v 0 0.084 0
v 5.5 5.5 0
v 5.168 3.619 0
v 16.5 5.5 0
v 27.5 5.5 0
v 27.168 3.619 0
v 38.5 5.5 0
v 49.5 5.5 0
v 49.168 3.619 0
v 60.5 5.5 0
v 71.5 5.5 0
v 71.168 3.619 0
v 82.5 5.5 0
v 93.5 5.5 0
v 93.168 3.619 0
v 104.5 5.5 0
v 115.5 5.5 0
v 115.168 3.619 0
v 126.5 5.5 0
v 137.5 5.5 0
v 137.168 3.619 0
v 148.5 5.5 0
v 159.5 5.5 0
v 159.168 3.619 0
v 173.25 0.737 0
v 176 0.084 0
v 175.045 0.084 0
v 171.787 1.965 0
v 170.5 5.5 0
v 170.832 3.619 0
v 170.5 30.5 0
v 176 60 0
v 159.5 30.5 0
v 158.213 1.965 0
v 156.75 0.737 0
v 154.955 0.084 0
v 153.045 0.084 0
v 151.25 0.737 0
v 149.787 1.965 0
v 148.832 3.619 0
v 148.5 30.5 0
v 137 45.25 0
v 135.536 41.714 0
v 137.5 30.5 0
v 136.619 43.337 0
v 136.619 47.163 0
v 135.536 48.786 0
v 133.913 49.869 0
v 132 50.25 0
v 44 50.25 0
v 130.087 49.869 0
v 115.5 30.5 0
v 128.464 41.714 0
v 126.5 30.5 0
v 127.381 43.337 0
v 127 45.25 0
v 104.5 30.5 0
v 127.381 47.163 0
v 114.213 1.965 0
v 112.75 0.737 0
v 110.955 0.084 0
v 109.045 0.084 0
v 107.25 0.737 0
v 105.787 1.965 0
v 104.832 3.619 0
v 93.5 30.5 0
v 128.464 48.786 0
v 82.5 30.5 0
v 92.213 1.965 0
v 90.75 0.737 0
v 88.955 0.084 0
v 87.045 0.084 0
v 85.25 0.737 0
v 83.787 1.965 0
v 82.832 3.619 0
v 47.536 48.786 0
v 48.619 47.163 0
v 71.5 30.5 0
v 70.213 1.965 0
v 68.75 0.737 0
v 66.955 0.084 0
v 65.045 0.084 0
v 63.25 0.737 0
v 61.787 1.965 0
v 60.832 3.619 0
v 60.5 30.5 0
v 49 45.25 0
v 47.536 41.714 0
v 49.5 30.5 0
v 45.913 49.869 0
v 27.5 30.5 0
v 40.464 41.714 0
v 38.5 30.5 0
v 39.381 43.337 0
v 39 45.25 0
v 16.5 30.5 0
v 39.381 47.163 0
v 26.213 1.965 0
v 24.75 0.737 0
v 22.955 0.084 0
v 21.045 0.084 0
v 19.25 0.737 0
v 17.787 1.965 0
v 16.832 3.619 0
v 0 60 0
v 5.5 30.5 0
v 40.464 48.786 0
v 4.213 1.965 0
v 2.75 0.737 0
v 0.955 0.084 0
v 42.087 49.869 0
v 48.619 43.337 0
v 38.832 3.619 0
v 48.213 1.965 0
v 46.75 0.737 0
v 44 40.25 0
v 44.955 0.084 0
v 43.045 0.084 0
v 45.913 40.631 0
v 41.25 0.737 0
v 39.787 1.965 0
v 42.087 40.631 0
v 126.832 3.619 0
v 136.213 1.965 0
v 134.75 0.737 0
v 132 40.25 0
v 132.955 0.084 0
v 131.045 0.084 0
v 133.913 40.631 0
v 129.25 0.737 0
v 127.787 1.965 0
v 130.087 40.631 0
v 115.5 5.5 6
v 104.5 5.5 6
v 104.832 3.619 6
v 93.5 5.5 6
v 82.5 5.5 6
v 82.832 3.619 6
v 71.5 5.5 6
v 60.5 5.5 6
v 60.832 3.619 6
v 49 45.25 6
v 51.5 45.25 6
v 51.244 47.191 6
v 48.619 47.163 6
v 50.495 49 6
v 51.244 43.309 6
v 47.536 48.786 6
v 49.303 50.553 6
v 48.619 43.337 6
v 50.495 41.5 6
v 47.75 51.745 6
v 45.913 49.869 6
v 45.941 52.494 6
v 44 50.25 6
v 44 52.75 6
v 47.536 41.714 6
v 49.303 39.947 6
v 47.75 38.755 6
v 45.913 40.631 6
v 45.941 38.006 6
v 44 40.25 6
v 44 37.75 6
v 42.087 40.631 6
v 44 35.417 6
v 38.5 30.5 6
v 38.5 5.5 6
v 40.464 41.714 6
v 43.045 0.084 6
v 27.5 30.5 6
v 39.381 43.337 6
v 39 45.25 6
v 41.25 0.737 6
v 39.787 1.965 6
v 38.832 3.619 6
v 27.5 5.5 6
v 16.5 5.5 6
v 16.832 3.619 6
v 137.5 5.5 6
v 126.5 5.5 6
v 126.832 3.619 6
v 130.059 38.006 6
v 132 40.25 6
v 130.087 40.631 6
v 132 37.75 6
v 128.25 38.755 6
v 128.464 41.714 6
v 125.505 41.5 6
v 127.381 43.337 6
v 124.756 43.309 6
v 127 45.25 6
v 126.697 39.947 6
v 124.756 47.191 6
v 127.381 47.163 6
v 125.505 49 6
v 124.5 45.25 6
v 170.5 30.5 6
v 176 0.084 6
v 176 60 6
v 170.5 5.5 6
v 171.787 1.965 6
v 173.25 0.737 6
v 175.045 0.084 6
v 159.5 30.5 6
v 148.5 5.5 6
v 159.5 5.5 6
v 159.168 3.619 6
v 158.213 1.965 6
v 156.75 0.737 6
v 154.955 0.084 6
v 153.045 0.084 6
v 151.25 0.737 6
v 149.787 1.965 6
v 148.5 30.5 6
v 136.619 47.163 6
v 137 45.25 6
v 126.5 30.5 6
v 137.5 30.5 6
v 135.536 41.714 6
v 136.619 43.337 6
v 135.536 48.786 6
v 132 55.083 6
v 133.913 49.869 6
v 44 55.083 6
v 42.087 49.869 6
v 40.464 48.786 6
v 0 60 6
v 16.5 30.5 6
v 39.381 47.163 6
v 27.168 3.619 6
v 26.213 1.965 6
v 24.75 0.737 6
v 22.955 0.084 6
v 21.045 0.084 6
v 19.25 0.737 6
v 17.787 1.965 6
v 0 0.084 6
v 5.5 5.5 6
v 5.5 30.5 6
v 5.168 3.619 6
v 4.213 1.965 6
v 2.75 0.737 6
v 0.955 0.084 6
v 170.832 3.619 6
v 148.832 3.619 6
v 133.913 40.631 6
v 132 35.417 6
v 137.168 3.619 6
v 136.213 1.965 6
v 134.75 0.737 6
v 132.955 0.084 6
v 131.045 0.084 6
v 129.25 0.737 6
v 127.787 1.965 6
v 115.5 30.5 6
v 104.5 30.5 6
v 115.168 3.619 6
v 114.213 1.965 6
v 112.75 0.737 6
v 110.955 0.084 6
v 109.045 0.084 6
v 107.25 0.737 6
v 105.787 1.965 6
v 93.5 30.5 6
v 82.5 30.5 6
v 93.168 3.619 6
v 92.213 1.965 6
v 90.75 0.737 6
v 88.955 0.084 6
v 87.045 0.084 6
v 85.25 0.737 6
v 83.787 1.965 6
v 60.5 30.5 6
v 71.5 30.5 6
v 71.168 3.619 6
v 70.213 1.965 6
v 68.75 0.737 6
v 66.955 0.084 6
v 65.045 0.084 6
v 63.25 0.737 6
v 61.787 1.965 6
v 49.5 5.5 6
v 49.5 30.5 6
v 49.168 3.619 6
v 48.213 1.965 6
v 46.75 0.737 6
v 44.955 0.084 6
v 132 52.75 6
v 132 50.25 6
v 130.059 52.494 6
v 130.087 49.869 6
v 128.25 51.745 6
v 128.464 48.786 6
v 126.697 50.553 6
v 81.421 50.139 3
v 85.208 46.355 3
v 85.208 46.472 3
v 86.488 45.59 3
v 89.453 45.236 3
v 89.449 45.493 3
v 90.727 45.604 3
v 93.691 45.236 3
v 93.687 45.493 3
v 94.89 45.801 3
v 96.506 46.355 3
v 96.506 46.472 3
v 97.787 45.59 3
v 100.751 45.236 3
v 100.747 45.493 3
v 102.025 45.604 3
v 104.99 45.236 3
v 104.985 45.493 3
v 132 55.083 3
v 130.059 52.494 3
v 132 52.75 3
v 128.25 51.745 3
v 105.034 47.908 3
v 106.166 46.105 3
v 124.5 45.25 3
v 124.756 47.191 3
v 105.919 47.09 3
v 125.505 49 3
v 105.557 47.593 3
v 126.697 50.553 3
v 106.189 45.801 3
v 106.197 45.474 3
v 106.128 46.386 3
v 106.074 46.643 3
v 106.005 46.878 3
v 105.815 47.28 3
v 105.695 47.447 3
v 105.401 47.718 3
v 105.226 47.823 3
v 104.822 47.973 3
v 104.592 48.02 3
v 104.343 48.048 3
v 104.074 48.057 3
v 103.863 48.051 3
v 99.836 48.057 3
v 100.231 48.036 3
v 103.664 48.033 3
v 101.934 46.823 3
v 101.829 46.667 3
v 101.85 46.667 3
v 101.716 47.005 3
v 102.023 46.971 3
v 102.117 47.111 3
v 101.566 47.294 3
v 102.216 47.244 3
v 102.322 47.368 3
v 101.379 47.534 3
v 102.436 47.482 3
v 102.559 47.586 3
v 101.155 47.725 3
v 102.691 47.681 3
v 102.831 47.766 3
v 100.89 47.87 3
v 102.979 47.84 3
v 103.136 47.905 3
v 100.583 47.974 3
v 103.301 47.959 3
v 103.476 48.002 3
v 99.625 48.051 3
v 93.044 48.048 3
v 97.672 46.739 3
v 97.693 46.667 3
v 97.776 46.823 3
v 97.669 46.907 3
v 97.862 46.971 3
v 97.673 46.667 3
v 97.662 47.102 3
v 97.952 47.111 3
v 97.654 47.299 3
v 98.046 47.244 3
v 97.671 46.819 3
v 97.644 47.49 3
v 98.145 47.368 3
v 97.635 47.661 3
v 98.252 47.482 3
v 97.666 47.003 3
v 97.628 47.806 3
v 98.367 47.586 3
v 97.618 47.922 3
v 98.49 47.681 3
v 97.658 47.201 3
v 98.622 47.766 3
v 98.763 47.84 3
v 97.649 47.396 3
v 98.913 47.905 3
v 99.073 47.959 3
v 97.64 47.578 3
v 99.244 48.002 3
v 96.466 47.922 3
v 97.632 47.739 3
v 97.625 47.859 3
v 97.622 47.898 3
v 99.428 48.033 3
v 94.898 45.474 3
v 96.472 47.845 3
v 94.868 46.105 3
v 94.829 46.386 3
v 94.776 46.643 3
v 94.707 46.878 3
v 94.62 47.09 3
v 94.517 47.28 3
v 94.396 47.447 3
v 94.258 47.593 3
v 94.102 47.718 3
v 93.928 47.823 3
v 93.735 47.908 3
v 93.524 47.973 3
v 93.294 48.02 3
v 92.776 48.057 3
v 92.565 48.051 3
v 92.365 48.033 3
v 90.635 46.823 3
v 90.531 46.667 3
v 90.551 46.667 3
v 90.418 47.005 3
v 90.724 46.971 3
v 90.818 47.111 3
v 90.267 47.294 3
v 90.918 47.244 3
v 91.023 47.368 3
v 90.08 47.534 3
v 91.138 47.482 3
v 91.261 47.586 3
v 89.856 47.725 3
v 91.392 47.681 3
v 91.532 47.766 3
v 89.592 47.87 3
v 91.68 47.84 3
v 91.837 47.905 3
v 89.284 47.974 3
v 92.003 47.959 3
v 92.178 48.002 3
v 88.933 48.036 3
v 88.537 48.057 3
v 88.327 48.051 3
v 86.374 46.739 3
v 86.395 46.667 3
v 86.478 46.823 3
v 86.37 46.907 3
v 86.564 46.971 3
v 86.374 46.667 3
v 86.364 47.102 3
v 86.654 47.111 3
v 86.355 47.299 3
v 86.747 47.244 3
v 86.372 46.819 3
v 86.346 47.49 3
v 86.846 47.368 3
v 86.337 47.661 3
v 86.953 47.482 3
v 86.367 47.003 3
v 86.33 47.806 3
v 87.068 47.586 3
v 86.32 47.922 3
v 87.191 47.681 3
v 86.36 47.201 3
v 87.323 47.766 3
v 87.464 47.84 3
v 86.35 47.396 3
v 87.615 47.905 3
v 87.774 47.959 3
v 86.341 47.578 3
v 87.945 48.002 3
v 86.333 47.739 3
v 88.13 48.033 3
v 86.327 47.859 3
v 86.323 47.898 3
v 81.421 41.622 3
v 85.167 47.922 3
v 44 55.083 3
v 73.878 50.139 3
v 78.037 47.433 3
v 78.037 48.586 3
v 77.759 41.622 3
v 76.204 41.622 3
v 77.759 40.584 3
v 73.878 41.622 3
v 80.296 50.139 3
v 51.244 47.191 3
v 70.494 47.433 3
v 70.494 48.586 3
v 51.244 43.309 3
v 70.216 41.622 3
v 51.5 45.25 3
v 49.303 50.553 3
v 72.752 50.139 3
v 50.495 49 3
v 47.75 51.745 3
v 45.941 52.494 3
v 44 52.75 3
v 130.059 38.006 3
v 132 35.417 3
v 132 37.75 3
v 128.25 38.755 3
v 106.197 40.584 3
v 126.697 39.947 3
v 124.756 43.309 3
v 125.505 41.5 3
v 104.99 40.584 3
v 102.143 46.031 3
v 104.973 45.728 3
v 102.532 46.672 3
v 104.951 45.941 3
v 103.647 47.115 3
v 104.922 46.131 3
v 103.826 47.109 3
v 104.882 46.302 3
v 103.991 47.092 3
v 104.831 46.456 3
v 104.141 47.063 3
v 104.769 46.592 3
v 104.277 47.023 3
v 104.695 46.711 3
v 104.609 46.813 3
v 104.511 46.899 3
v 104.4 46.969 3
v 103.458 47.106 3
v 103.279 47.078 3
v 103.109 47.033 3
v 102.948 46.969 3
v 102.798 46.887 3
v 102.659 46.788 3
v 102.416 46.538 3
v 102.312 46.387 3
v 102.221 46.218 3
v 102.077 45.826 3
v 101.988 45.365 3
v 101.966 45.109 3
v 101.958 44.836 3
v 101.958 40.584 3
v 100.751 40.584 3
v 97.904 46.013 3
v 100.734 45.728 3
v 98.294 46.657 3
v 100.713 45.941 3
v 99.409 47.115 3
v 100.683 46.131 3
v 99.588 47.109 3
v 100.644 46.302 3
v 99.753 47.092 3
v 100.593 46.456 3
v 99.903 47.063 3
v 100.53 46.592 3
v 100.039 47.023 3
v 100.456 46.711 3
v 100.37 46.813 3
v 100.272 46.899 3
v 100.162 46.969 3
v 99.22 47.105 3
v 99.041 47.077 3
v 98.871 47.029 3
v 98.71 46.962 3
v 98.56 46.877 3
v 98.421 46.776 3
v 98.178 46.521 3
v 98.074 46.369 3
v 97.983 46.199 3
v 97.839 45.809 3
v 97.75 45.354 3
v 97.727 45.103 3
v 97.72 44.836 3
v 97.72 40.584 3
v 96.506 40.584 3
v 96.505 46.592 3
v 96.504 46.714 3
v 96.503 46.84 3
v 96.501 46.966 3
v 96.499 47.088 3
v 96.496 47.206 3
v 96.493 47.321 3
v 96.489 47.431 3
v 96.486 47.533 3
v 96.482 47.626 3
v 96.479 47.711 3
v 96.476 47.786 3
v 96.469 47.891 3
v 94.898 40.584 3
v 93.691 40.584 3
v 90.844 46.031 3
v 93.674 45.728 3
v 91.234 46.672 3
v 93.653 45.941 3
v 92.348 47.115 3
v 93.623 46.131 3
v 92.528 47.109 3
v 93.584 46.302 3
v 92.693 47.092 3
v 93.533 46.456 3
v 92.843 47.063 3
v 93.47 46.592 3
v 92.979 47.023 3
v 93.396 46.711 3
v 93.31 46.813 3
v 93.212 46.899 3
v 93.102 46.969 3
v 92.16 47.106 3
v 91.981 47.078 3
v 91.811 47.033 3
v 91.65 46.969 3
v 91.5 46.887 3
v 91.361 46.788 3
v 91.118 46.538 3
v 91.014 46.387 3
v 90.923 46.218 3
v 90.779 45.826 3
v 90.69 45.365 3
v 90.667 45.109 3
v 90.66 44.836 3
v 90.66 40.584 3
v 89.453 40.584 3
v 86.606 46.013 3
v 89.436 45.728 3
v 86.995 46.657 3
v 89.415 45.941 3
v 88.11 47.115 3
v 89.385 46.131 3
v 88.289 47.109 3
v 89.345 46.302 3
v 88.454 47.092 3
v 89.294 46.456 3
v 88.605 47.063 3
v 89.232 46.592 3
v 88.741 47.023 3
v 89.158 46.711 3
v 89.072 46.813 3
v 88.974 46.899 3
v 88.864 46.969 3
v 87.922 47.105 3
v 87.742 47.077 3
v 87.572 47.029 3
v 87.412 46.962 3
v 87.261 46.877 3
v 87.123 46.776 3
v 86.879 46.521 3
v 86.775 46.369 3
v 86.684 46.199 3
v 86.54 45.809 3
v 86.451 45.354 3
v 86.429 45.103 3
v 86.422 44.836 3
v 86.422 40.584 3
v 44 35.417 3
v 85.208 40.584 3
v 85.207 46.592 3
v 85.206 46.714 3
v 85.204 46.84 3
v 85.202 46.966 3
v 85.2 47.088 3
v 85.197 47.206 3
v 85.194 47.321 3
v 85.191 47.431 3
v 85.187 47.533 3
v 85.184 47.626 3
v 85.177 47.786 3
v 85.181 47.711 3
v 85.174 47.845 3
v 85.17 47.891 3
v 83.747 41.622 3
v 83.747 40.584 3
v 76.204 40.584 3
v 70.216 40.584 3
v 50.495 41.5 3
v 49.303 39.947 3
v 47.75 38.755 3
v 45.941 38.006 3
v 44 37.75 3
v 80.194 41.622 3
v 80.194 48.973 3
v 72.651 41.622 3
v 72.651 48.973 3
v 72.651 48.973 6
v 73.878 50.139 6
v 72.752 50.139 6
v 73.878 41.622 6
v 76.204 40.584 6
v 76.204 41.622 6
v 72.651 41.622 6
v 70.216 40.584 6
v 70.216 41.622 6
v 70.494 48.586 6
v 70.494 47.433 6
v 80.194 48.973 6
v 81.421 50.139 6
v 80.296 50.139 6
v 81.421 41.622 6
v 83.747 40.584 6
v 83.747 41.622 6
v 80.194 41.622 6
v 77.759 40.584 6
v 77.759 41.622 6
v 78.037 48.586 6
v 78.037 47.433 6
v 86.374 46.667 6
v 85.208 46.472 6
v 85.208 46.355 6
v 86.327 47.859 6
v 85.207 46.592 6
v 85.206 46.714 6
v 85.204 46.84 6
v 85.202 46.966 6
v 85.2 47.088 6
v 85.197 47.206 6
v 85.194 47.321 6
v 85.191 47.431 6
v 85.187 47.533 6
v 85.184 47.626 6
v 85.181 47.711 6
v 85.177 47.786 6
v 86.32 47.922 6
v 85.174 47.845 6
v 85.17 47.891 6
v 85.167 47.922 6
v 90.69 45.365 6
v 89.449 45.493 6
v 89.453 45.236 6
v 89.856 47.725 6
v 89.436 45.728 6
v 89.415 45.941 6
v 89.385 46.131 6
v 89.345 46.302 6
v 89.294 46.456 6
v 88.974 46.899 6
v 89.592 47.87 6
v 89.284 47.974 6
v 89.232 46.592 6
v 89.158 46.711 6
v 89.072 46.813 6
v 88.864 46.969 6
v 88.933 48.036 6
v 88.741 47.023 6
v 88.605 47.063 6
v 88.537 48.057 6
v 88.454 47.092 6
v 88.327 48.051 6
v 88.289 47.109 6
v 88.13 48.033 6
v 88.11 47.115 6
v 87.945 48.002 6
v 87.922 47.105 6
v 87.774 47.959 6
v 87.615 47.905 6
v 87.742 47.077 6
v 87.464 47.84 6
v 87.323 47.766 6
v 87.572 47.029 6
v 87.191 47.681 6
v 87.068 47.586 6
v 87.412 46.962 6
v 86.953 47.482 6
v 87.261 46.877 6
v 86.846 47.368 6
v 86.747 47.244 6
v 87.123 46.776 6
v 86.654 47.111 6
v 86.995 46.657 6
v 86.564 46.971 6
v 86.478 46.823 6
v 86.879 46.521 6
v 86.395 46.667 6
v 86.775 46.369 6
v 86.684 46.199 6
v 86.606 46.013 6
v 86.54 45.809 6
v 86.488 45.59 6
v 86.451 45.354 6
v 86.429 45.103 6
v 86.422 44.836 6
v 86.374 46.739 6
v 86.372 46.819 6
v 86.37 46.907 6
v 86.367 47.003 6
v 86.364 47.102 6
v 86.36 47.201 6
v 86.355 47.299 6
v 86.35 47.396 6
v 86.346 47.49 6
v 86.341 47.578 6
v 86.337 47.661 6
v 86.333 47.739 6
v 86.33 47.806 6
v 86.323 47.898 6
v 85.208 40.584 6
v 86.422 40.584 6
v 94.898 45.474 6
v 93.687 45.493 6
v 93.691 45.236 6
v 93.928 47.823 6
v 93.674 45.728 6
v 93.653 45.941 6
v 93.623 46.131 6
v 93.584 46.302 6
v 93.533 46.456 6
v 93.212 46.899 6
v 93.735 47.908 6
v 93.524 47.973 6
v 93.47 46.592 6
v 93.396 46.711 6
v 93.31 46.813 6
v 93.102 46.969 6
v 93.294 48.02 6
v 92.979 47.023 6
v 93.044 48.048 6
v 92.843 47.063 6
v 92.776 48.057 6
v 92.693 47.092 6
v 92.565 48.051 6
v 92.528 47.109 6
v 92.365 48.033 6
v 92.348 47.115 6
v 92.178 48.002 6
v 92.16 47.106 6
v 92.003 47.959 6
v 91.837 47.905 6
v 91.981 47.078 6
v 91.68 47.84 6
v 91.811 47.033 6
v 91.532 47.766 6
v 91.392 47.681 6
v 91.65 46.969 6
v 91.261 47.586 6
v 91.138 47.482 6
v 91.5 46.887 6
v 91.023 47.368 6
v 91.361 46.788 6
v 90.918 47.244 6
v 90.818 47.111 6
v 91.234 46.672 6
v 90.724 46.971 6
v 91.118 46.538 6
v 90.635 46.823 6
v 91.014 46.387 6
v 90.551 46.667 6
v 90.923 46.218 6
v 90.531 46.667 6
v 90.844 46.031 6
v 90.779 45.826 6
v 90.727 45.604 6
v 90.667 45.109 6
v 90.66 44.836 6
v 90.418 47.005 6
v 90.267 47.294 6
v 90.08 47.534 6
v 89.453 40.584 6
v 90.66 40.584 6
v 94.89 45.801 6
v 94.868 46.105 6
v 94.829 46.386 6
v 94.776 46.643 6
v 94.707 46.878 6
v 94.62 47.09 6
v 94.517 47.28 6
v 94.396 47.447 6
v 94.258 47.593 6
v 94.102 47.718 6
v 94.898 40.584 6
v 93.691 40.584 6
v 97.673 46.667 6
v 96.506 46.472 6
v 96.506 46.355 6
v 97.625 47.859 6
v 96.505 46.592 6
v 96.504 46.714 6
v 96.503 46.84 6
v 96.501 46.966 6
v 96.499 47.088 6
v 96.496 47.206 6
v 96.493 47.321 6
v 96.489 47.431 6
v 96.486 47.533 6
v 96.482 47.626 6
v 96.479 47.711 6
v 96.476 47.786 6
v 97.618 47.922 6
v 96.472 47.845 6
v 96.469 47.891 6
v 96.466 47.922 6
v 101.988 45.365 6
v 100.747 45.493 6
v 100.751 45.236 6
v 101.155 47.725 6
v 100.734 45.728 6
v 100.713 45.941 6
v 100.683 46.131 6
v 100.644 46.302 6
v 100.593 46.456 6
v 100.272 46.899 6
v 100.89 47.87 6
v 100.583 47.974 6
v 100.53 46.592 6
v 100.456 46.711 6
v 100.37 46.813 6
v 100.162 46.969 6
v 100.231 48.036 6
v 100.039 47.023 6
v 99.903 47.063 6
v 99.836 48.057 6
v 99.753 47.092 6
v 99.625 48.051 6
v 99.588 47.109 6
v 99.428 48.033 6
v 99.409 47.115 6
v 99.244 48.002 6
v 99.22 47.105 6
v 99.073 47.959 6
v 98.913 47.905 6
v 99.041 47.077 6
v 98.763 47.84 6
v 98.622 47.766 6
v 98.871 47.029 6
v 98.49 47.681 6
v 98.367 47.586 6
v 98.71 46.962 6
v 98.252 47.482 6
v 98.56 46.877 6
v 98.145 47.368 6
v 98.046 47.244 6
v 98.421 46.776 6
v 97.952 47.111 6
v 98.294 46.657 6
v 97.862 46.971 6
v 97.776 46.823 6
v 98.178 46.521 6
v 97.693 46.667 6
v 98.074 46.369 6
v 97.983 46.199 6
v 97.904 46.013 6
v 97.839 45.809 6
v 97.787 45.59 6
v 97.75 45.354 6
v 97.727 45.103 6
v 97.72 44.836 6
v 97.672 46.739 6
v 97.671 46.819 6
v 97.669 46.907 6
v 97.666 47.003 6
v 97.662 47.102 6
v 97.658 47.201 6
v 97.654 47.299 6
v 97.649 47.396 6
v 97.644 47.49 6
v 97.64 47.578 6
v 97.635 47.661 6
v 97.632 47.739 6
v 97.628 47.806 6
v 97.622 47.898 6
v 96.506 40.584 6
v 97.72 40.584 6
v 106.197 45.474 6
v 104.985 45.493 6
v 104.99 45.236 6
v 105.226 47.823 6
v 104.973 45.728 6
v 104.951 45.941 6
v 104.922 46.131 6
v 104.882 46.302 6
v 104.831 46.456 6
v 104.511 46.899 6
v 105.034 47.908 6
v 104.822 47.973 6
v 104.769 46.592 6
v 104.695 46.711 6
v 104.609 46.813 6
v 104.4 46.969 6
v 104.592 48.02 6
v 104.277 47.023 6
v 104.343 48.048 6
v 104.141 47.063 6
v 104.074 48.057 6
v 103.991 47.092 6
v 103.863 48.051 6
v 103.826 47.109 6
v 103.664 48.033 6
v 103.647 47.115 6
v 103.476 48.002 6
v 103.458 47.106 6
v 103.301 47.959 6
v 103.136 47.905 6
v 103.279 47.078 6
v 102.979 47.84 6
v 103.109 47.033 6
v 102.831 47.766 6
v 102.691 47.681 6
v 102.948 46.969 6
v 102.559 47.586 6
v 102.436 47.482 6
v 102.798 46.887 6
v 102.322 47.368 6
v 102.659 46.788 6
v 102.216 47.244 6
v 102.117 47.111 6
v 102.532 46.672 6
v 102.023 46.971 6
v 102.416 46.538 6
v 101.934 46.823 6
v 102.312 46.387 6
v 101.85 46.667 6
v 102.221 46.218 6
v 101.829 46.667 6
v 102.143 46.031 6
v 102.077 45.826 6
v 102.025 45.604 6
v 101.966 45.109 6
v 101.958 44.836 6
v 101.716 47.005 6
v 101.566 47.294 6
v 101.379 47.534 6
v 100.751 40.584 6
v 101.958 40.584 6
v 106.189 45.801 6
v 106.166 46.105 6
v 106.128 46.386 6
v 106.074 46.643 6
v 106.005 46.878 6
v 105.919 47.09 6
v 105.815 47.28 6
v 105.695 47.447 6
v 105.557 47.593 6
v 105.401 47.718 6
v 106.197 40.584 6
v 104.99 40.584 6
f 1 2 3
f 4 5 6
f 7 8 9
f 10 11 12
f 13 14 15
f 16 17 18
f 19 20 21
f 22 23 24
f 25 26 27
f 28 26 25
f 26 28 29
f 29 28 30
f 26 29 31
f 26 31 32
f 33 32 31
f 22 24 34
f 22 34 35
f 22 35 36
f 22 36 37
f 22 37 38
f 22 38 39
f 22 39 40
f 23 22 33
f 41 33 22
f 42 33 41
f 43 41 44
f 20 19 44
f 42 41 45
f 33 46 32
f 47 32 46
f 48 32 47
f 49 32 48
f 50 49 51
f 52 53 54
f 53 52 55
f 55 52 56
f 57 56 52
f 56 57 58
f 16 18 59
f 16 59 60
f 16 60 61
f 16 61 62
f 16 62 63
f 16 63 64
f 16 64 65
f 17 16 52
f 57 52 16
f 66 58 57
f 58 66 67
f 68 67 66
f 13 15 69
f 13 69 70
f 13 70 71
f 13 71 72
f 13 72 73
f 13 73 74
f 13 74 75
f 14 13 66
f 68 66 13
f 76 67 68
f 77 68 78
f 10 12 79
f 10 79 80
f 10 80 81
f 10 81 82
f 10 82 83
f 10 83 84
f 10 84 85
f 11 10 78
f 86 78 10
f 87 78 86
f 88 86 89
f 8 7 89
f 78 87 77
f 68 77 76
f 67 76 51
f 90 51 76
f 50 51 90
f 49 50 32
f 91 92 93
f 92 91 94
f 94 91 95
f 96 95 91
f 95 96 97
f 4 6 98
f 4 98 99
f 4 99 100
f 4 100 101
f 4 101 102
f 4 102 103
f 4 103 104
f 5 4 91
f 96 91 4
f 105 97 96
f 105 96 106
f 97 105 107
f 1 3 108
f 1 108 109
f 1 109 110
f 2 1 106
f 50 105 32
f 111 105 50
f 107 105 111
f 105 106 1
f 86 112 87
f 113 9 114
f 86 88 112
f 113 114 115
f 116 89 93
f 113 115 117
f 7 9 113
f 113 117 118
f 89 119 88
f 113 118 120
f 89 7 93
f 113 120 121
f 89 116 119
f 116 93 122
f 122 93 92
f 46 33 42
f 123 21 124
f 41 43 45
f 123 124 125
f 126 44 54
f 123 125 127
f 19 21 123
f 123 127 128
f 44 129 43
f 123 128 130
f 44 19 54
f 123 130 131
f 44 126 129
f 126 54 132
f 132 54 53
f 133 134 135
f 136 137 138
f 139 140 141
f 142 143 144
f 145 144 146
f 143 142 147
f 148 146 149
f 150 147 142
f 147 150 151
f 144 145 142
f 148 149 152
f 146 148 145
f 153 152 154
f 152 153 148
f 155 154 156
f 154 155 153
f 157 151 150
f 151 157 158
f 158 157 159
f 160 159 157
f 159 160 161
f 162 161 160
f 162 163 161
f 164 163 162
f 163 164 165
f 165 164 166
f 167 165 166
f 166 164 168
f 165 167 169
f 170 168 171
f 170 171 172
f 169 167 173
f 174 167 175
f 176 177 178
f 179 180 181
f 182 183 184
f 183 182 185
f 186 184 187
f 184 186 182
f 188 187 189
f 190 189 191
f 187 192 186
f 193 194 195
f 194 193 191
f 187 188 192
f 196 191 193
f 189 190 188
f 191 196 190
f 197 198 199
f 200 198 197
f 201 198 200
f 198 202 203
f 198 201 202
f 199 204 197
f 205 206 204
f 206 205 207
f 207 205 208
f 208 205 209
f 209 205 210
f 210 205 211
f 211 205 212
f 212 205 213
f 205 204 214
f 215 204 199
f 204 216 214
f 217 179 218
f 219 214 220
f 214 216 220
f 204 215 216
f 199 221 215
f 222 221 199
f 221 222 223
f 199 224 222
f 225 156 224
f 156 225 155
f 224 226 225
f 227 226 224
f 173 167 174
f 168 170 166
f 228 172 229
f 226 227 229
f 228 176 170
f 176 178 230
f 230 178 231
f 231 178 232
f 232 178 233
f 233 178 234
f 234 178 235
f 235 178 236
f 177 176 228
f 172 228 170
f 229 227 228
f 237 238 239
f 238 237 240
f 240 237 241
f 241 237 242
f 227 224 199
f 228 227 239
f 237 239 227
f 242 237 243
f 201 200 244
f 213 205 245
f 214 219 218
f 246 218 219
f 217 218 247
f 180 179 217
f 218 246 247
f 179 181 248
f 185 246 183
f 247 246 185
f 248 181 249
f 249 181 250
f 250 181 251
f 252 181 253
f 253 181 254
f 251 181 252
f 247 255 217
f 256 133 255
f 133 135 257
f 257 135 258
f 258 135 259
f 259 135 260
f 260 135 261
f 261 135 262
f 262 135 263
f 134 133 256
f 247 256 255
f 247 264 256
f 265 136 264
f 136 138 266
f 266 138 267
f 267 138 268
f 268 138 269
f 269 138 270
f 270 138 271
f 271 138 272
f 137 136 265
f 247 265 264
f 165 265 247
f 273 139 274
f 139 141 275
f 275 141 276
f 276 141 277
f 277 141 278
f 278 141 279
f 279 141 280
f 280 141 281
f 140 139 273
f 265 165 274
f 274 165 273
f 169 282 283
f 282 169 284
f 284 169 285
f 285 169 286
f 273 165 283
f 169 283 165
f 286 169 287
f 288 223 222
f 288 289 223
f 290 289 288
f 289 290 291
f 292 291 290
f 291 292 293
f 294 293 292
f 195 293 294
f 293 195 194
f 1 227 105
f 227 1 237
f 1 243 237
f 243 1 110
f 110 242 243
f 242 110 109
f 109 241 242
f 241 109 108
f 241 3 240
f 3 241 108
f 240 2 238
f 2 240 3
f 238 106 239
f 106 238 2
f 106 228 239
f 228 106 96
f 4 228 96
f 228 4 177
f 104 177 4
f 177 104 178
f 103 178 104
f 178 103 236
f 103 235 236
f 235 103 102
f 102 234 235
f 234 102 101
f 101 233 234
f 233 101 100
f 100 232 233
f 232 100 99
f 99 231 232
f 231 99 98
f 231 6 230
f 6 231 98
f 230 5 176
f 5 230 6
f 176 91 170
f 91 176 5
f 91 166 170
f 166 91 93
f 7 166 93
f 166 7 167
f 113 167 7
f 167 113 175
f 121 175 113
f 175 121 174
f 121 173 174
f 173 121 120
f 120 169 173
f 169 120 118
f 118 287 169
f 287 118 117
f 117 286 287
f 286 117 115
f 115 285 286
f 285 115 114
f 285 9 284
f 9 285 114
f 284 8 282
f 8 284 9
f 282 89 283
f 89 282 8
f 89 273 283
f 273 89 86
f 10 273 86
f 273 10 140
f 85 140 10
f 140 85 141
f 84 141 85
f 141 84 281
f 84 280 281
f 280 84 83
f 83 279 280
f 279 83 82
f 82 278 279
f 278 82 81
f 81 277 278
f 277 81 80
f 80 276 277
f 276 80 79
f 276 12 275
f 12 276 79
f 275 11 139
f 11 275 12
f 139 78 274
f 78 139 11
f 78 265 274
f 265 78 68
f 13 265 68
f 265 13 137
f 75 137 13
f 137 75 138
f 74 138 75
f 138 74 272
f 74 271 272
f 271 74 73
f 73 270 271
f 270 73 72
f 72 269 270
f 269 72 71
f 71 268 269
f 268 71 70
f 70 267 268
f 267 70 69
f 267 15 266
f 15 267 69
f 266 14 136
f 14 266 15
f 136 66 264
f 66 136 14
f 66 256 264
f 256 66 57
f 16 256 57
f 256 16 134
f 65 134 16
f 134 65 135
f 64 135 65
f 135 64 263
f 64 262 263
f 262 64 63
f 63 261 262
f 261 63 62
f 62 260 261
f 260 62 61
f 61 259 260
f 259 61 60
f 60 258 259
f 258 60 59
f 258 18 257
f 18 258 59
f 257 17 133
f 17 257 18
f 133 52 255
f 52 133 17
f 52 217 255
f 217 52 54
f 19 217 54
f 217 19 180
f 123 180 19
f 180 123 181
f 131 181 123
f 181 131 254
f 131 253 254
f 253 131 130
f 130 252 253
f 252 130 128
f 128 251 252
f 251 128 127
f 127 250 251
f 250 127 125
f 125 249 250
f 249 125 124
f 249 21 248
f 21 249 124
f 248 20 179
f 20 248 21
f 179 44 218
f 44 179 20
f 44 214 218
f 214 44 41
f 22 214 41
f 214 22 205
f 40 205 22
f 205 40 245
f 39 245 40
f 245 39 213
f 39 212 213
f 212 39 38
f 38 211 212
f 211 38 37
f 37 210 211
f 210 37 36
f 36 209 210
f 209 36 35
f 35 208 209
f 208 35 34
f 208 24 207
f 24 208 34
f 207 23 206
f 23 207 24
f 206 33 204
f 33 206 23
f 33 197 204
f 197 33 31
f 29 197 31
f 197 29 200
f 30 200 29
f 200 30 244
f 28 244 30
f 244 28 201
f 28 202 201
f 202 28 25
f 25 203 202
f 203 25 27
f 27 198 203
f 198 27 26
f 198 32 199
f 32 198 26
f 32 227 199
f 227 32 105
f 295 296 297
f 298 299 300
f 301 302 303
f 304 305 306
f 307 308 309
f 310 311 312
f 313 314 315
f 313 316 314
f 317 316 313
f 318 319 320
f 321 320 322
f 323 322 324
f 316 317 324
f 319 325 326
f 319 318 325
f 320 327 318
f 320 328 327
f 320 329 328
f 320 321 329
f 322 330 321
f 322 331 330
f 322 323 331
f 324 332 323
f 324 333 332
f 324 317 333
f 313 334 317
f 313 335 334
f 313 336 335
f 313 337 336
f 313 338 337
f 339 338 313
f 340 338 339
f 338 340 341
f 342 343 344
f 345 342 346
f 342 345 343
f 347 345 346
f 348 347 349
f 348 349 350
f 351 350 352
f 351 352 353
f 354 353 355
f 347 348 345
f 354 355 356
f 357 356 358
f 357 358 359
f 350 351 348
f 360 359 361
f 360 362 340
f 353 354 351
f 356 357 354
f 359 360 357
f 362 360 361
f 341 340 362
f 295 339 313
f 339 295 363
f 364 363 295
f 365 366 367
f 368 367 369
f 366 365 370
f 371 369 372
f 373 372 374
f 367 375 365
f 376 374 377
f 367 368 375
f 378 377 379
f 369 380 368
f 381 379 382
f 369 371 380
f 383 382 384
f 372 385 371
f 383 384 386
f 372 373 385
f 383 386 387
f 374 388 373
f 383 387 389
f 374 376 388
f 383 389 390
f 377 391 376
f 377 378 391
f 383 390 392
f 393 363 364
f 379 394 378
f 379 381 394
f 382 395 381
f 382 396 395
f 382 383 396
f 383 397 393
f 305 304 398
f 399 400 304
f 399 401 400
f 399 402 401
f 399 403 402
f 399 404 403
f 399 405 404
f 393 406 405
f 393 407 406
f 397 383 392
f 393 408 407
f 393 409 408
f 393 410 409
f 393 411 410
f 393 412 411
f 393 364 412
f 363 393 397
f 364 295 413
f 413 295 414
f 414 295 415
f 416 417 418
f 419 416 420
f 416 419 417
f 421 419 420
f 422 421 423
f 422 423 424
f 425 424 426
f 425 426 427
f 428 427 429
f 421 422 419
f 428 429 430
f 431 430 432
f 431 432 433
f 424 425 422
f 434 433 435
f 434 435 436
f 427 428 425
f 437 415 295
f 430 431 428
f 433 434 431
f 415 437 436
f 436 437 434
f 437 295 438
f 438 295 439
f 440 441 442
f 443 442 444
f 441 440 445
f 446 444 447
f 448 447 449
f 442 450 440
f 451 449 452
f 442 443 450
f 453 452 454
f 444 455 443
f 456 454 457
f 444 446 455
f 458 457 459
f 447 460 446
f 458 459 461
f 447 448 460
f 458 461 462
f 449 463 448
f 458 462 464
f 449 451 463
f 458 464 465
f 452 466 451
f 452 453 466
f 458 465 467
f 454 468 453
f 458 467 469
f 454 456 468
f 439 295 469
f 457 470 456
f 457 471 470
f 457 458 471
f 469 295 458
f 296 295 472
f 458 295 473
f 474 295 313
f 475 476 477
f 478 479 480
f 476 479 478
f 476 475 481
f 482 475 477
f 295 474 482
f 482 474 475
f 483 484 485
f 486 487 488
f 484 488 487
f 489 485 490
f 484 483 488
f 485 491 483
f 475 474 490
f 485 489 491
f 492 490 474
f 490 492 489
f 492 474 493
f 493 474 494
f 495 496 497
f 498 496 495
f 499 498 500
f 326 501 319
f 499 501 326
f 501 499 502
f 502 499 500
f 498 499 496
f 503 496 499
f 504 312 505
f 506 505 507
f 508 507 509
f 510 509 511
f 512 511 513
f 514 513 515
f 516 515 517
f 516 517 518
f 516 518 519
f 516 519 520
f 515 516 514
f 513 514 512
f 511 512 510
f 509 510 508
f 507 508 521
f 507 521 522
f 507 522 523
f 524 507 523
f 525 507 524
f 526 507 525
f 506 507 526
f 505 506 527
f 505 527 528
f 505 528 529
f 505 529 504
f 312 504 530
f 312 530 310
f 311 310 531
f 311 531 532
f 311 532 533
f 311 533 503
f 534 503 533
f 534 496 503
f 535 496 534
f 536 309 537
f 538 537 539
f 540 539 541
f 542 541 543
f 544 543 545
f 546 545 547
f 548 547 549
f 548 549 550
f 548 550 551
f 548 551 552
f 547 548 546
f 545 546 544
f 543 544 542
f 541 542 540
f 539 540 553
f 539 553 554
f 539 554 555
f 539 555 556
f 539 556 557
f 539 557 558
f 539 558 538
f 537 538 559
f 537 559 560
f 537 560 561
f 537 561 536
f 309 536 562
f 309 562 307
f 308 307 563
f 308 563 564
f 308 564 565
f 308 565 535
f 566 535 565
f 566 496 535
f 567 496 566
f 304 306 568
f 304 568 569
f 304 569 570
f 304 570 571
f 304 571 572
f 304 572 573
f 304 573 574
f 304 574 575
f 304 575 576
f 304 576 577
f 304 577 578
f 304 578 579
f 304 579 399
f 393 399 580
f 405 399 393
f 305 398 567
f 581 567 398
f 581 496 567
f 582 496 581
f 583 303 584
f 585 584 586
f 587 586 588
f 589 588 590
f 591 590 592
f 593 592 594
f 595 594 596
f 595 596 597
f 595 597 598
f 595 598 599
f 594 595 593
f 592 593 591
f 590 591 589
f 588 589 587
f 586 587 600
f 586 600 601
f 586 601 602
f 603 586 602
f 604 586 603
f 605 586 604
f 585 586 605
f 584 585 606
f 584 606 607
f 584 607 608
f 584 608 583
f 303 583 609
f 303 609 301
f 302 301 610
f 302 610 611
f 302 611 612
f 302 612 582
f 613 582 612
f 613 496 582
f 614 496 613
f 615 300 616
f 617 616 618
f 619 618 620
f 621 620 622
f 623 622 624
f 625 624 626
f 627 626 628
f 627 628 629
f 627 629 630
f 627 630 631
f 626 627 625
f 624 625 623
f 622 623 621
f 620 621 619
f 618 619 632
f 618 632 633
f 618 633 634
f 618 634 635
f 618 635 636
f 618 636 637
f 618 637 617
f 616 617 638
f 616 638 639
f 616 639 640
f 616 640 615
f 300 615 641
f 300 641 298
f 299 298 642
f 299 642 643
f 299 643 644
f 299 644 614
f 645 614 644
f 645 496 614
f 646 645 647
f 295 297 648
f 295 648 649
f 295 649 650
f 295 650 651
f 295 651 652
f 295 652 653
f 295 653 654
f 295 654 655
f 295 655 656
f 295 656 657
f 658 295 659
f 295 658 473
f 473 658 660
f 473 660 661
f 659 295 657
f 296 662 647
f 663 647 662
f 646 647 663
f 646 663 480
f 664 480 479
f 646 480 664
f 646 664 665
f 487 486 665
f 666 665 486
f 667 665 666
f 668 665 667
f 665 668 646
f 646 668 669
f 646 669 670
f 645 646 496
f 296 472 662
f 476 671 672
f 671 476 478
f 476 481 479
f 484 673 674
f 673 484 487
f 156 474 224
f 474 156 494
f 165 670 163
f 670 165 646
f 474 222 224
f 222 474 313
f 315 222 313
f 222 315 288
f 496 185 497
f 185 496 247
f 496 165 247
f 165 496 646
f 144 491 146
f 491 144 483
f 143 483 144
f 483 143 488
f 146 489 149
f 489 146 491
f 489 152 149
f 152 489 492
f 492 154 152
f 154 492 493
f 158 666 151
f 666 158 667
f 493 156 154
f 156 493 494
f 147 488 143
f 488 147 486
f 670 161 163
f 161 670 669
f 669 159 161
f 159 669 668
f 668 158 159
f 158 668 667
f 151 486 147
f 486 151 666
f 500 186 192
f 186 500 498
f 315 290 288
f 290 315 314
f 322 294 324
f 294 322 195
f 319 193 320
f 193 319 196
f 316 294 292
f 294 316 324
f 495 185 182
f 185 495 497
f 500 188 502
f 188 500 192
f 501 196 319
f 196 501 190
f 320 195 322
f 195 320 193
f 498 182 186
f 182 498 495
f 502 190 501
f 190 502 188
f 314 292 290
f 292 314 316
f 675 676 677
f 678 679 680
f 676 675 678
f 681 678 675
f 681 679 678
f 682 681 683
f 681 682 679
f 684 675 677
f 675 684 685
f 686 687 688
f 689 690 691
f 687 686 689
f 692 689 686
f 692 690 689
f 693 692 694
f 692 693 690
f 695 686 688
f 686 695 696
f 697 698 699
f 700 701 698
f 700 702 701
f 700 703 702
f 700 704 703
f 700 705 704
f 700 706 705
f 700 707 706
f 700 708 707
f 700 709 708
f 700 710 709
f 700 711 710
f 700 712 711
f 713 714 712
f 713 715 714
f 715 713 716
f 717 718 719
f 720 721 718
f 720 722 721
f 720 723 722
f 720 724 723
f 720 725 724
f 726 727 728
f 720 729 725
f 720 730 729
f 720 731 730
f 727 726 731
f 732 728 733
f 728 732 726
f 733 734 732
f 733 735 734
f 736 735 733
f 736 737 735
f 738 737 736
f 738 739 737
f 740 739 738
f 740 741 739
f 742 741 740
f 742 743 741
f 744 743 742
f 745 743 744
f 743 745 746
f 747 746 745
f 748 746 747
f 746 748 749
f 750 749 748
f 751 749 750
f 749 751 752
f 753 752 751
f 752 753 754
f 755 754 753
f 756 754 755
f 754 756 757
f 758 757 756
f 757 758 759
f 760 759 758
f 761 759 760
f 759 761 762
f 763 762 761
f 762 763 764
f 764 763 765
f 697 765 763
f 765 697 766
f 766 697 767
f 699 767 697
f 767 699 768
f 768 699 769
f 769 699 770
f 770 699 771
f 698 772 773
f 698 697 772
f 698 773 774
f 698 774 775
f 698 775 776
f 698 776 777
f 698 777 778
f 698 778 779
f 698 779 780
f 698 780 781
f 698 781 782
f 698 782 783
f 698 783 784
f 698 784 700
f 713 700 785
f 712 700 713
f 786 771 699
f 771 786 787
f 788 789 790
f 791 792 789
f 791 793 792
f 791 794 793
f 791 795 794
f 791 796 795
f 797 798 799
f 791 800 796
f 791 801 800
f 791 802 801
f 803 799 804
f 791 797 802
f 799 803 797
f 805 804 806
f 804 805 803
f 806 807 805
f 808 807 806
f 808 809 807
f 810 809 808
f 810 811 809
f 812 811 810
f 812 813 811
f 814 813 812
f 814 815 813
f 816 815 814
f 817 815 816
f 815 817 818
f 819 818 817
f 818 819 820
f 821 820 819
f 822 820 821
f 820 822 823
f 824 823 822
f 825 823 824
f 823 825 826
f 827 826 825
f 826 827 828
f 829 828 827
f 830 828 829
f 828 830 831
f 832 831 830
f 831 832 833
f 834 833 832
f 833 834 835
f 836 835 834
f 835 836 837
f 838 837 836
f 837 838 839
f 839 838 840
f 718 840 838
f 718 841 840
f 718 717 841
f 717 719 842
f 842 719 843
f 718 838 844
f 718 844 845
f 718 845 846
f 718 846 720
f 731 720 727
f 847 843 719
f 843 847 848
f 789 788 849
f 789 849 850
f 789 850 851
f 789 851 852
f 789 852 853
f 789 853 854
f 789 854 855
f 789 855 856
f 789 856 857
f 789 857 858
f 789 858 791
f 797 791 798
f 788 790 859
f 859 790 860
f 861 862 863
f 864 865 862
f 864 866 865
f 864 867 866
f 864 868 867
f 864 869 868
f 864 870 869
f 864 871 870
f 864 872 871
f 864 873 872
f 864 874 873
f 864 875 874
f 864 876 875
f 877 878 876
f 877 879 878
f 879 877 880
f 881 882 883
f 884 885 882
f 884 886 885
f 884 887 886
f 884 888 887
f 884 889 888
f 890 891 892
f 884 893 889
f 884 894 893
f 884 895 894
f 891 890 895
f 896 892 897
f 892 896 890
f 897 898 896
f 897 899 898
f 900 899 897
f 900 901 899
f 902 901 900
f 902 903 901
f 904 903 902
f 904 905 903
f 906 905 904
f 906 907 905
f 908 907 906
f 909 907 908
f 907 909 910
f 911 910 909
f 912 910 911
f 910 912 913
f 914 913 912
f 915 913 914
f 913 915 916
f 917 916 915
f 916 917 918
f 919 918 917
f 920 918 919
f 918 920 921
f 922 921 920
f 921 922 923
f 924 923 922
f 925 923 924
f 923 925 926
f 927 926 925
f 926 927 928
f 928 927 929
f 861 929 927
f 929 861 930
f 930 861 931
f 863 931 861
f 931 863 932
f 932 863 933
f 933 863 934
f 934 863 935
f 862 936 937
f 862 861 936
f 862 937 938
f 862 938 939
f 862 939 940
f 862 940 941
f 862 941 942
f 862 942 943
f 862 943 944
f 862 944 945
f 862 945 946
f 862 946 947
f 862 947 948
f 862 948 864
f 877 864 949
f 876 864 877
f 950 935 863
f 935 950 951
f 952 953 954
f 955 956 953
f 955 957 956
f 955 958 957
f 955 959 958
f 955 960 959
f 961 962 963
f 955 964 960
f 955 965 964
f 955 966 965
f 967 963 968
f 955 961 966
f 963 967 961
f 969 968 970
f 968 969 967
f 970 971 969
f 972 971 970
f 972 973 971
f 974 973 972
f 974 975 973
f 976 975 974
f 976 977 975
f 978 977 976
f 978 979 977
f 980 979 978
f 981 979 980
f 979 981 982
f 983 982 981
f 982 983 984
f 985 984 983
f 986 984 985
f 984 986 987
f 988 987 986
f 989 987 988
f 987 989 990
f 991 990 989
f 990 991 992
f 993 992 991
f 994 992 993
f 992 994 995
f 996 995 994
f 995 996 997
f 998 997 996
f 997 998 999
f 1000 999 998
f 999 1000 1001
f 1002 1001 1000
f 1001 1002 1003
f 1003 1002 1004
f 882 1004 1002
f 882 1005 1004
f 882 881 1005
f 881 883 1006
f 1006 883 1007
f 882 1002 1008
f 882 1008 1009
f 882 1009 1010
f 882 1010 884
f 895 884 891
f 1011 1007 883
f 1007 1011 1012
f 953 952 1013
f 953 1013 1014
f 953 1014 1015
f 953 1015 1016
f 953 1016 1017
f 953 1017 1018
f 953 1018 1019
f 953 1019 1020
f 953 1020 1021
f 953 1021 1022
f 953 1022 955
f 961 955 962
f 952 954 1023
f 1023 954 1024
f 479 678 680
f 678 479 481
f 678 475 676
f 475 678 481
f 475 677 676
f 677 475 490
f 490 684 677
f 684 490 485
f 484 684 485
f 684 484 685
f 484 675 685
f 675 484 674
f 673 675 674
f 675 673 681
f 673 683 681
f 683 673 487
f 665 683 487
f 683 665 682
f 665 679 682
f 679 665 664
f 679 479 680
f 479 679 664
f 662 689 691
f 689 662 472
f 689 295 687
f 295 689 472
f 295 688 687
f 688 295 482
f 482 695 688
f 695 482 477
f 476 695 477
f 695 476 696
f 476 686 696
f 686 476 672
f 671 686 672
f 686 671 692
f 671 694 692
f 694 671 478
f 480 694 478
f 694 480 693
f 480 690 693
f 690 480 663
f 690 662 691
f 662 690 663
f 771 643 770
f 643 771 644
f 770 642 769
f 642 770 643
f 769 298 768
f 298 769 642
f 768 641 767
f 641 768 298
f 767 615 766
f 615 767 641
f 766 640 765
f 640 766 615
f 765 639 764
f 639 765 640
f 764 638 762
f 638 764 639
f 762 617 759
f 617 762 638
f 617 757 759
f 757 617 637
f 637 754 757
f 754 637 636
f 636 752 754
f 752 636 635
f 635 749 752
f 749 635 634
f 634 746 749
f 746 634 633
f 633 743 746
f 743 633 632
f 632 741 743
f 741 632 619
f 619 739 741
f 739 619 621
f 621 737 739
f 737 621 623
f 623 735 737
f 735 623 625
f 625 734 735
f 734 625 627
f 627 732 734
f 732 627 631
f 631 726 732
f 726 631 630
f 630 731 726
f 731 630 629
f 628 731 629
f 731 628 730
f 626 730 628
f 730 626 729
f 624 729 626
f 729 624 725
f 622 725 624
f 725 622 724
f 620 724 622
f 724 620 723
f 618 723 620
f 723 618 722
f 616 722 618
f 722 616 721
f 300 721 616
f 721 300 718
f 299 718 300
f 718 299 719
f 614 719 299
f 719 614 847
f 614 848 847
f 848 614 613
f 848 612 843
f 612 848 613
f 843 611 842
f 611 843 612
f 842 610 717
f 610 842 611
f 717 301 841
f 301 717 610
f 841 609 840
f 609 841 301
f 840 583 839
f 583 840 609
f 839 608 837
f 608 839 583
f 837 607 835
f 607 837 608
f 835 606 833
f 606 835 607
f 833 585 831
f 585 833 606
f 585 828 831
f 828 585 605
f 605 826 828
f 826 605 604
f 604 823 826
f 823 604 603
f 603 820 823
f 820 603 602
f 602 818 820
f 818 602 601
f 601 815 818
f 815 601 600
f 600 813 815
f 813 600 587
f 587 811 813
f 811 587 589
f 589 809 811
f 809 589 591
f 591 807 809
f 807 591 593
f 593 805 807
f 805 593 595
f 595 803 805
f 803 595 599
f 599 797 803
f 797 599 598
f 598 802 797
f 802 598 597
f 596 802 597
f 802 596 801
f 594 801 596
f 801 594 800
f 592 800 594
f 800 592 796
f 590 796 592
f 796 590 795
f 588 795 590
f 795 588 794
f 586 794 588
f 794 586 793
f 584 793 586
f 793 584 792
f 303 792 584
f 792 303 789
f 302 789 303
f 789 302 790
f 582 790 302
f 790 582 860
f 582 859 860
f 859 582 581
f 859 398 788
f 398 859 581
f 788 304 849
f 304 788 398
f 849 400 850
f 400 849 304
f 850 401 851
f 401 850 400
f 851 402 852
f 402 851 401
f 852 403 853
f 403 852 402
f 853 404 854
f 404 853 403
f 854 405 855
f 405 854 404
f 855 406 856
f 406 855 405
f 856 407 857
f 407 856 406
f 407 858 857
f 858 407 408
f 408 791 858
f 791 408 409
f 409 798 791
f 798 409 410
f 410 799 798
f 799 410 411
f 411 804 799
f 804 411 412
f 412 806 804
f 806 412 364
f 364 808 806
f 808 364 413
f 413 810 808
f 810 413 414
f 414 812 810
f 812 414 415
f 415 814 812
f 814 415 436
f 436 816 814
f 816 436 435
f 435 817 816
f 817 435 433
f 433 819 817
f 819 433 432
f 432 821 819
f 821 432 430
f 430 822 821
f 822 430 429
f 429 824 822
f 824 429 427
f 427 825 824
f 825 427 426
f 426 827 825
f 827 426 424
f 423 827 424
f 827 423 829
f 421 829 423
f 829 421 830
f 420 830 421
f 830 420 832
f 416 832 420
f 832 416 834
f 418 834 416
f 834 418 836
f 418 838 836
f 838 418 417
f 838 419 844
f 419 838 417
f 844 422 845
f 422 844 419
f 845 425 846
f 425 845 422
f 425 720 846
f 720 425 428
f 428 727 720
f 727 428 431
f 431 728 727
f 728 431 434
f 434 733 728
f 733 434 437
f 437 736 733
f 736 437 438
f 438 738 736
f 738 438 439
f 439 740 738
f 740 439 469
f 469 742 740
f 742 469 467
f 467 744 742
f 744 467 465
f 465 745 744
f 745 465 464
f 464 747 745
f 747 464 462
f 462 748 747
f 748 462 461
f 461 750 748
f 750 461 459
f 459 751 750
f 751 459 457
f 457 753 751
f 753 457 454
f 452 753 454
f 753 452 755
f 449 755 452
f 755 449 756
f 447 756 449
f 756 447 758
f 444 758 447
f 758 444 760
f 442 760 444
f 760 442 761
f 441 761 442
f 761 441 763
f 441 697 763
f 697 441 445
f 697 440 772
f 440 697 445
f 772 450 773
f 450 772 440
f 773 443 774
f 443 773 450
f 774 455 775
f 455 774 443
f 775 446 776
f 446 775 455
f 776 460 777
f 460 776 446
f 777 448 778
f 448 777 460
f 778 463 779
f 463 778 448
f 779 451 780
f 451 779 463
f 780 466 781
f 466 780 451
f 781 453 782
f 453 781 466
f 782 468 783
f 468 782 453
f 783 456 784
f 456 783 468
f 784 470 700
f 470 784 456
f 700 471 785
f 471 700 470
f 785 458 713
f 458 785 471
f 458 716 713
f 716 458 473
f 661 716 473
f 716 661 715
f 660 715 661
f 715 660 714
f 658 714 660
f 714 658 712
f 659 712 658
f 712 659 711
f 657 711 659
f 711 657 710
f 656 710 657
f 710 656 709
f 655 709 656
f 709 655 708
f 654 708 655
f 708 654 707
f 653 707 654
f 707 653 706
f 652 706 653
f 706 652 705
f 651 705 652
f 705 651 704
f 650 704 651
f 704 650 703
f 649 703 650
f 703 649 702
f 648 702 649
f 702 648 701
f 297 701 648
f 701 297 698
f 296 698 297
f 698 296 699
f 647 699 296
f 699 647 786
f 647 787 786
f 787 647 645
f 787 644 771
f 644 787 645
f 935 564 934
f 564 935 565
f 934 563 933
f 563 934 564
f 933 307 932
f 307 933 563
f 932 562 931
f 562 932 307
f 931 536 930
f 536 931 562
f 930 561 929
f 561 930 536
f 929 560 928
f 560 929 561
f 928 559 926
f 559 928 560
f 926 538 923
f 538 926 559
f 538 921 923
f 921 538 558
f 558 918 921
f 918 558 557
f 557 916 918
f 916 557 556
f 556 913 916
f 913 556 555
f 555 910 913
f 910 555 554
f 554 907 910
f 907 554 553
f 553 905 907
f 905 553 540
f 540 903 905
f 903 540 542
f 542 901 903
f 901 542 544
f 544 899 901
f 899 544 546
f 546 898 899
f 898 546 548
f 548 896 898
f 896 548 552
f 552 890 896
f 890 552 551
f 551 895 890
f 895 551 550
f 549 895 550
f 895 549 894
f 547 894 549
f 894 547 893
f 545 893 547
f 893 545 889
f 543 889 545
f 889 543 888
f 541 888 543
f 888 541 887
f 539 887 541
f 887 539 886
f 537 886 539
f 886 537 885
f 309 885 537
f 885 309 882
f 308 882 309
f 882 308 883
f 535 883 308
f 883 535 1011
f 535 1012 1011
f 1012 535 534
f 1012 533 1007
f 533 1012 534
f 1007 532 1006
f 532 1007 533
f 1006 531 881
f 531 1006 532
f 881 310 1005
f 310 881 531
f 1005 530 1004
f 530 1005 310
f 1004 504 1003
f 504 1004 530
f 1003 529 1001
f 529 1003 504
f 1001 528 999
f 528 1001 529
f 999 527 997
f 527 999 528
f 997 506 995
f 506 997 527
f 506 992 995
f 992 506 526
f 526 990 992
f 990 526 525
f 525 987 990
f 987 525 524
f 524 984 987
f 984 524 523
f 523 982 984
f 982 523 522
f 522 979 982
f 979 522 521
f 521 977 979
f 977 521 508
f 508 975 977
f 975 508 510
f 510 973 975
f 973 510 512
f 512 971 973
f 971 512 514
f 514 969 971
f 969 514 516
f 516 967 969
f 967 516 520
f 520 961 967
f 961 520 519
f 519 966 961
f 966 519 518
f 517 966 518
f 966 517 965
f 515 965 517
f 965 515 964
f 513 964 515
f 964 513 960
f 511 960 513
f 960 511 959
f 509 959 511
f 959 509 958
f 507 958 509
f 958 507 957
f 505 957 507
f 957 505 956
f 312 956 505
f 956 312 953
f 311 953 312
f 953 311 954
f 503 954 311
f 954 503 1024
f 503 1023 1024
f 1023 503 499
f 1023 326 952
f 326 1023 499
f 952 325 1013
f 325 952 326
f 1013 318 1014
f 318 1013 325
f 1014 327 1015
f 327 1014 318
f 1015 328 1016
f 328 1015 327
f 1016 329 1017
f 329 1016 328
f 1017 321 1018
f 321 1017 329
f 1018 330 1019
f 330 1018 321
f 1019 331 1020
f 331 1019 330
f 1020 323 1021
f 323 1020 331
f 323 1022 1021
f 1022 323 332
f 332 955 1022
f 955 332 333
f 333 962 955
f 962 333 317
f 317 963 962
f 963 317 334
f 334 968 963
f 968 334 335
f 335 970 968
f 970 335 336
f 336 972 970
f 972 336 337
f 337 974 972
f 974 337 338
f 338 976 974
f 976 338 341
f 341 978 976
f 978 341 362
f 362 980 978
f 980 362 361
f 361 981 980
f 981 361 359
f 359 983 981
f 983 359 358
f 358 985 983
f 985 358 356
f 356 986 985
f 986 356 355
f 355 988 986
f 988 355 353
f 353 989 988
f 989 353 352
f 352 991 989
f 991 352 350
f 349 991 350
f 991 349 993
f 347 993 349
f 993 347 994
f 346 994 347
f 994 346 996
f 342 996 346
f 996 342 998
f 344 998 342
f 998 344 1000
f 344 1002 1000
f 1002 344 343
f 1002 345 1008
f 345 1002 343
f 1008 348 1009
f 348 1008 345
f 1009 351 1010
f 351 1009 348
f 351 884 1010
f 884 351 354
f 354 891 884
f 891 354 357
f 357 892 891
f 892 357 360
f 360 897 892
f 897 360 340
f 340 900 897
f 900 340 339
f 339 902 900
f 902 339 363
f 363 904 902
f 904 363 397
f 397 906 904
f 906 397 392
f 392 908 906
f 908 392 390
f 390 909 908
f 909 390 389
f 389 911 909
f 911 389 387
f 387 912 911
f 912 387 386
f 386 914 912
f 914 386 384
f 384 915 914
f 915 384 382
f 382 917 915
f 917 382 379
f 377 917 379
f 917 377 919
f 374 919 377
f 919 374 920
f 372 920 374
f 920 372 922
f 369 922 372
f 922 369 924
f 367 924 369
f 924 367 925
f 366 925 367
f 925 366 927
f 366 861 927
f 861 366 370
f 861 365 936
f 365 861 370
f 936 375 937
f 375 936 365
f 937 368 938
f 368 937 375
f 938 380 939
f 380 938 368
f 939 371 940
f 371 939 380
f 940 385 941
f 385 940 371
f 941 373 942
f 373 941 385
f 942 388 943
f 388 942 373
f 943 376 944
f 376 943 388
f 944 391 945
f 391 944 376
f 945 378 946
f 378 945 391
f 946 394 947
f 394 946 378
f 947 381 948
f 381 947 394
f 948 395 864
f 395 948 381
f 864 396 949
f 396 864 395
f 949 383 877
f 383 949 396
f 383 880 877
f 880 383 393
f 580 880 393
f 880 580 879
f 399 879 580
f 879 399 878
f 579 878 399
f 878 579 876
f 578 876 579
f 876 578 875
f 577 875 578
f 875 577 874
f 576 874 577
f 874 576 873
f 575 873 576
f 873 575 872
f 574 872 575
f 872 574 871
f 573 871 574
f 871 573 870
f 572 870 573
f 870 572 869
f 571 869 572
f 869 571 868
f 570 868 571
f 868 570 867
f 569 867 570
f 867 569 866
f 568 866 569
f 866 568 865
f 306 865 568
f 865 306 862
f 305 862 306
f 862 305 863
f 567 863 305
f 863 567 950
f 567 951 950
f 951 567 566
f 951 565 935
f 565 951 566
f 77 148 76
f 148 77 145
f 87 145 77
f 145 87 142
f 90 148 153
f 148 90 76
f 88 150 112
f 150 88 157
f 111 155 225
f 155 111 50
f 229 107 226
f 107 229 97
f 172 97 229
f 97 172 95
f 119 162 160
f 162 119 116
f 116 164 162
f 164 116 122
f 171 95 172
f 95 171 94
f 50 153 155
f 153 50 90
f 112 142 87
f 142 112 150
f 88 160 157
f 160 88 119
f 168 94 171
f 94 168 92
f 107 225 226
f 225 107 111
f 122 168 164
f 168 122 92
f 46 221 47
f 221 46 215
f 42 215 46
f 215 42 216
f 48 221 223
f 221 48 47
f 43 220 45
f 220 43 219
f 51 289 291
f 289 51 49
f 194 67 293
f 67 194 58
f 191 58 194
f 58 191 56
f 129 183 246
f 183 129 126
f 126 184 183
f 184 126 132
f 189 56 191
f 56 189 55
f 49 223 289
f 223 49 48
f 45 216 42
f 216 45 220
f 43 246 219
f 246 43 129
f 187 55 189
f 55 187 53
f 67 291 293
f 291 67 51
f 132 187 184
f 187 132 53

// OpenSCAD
spacing = 11;
depth = 25;
teeth = 8;

breadth = 60;
thickness = 6;

{
    
    toothLength = (spacing/2)+depth;
    
    totalWidth = (teeth)*2*spacing;
    
    centerlineOffset = toothLength + (breadth-toothLength)/2;

    difference() {
            
        union() {
            difference() {
                comb(toothLength, totalWidth);
                
                // Label Plate
                translate([totalWidth/2, centerlineOffset, thickness-3]) {
                    linear_extrude(3) {
                        square([totalWidth/2, (breadth-toothLength)/3*2], center=true);
                    }
                }

                         
            }
        
            // Label
            translate([0,0,thickness-3]) {
                linear_extrude(3) {
                    translate([totalWidth/2, centerlineOffset, thickness]) {
                        text(text = str(spacing, "mm"), valign="center", halign="center");
                    }
                }
            }
            
            for(i = [1:2:3]) {
                translate([totalWidth/4*i, centerlineOffset, 0]) {
                    cylinder(d=15, h=thickness);
                }   
            }
        }
            
        // Holes
        for(i = [1:2:3]) {
            translate([totalWidth/4*i, centerlineOffset, 0]) {
                cylinder(d=10, h=thickness);
            }
        }
    }
}

module comb(toothLength, totalWidth) {

    linear_extrude(thickness) {

         intersection() {
            
            square([totalWidth, breadth]);
            
            union() {
                translate([0, toothLength,0]) {
                    square([totalWidth, breadth-toothLength]);
                }

                translate([spacing*2, spacing/2, 0]) {
                    for(i=[-1:1:teeth-1]) {
                        translate([i*2*spacing, 0, 0]) {
                            union() {
                                circle(d=spacing);
                                translate([-spacing/2, 0, 0]) {
                                    square([spacing,depth]);
                                }
                            }
                        }
                    }
                }
            }
        }
    }

}
